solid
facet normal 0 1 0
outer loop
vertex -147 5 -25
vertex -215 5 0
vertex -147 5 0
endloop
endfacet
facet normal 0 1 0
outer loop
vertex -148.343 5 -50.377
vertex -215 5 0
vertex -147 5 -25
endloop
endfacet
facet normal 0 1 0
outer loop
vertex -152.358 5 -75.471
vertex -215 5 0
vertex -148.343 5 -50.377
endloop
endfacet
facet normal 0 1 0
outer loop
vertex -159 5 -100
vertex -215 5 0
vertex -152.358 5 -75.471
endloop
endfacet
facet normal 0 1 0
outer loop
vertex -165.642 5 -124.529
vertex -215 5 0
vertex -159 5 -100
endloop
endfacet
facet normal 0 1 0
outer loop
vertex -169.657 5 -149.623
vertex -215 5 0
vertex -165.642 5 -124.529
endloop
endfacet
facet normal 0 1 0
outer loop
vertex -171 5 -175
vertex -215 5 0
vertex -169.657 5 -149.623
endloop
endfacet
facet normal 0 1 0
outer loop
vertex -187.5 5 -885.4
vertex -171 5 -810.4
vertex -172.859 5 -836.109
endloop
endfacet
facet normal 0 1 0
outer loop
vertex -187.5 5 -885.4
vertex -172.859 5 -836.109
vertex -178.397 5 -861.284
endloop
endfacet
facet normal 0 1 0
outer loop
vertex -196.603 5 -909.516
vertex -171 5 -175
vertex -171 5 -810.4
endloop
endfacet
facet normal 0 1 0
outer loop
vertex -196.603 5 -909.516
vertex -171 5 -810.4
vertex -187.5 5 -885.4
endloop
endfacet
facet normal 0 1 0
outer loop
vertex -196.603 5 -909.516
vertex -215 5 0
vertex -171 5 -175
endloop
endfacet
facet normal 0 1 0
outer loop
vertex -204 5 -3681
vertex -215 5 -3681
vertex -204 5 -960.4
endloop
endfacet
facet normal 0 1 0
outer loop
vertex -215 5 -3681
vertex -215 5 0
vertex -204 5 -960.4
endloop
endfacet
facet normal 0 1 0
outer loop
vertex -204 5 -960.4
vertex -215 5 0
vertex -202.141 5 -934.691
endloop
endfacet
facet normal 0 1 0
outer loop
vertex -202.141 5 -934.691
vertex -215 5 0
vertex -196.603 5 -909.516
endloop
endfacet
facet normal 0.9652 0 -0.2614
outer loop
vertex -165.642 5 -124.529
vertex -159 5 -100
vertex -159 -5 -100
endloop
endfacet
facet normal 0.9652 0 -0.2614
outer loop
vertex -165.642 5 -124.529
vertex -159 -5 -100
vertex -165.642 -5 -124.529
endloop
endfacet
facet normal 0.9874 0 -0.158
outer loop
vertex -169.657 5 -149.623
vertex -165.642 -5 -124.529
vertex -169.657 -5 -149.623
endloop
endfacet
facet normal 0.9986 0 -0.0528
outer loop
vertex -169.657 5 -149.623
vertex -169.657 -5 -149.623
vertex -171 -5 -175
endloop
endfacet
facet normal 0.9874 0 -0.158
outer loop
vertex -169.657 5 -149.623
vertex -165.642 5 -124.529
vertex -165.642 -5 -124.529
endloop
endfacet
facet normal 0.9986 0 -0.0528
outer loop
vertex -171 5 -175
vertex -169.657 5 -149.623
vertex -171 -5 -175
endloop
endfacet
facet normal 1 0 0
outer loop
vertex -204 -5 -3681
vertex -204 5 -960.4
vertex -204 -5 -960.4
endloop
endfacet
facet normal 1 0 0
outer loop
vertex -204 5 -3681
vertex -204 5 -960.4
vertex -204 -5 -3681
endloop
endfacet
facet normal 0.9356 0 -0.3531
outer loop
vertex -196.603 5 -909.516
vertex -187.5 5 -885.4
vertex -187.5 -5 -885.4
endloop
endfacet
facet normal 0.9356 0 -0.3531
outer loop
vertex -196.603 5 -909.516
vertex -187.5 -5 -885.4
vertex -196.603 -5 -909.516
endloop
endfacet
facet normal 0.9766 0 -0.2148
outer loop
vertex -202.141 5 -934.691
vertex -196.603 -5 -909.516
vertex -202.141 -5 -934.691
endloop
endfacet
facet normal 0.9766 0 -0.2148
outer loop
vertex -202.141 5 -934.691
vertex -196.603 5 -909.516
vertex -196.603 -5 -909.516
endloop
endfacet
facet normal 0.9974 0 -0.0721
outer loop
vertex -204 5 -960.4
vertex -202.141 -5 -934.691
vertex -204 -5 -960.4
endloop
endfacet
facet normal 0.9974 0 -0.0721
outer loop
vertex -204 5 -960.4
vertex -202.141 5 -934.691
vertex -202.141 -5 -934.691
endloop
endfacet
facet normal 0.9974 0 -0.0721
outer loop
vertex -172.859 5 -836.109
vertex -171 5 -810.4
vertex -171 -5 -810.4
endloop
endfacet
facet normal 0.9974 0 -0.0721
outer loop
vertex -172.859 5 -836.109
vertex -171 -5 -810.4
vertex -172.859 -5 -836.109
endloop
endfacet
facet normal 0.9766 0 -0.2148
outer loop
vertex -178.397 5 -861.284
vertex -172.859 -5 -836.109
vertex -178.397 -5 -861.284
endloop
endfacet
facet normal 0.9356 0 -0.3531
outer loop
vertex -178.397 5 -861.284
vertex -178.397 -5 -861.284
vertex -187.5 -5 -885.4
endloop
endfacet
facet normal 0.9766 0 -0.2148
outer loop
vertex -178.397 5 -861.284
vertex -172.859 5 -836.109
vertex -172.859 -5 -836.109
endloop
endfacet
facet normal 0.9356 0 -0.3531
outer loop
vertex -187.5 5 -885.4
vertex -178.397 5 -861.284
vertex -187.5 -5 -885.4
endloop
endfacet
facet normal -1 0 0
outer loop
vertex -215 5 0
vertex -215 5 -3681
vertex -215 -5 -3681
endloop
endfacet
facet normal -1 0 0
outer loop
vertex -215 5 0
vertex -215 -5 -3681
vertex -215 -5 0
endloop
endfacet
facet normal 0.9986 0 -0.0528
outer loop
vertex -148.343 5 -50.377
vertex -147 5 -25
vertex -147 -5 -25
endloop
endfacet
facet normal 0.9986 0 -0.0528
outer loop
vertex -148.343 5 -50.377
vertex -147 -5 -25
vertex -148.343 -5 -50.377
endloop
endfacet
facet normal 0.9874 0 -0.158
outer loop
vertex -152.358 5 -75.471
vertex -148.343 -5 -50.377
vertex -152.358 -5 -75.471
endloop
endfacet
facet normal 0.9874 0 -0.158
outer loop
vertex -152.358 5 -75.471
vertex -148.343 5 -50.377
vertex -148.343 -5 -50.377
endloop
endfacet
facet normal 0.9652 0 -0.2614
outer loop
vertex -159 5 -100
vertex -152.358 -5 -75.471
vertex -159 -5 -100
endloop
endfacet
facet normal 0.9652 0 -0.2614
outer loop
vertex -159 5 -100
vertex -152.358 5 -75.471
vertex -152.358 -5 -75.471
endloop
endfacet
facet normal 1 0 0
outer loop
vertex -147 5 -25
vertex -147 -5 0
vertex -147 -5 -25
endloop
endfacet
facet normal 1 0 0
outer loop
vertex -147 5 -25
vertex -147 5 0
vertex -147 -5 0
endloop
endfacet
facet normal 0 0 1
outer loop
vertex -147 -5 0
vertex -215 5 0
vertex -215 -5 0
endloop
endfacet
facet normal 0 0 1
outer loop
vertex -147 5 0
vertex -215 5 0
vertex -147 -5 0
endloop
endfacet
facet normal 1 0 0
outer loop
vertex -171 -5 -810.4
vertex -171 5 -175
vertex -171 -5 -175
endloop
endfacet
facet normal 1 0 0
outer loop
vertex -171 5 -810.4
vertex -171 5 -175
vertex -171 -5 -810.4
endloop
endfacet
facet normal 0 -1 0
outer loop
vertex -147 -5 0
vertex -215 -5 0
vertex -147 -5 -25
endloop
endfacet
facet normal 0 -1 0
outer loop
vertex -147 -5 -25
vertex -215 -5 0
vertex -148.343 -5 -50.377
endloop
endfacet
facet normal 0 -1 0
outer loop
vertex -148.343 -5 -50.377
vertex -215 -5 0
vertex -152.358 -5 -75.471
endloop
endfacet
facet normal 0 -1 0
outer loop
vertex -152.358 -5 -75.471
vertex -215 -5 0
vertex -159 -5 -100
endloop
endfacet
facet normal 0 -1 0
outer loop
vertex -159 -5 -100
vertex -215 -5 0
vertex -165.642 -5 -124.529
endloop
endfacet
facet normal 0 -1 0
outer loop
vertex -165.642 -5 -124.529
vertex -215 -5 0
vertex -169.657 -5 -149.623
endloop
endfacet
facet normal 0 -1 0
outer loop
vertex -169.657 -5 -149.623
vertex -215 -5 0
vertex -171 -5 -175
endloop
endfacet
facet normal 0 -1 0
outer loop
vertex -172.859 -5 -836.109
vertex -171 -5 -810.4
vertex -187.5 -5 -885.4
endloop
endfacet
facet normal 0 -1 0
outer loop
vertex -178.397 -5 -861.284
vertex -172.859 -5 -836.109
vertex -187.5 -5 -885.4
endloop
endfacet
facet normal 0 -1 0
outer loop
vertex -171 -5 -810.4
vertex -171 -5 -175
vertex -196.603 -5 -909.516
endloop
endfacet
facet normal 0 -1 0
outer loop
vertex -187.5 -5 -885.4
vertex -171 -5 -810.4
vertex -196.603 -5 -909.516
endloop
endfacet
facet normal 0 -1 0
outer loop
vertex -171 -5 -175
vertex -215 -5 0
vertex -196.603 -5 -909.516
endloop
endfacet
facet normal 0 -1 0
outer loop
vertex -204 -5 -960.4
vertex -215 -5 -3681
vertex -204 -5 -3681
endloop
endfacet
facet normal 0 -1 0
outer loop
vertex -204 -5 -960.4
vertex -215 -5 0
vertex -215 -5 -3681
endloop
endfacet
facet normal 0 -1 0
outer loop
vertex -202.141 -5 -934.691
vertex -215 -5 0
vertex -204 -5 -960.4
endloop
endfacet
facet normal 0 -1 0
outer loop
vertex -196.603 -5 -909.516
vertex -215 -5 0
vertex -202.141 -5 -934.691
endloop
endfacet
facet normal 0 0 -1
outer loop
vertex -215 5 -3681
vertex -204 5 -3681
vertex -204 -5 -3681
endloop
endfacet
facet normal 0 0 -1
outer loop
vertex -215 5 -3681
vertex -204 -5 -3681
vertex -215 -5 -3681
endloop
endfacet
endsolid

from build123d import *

# Parameters (mm, degrees)
EXTRUDE_THIN1_DEPTH = 5
EXTRUDE1_DEPTH      = 10


with BuildPart() as part:
    # Sketch1 → Extrude-Thin1 (new body, symmetric)
    with BuildSketch(Plane(origin=(0, 0, 0), x_dir=(1, 0, 0), z_dir=(0, 1, 0))):
        with BuildLine():
            Line((-147, 0), (-147, 25))
            ThreePointArc((-147, 25), (-150.018958103, 62.976966704), (-159, 100))
            ThreePointArc((-159, 100), (-167.981041897, 137.023033296), (-171, 175))
            Line((-171, 175), (-171, 810.4))
            ThreePointArc((-171, 810.4), (-175.173739961, 848.796777209), (-187.5, 885.4))
            ThreePointArc((-187.5, 885.4), (-199.826260039, 922.003222791), (-204, 960.4))
            Line((-204, 960.4), (-204, 3680.99975))
            Line((-204, 3680.99975), (-215, 3680.99975))
            Line((-215, 3680.99975), (-215, 960.4))
            ThreePointArc((-215, 960.4), (-210.569349172, 919.639743182), (-197.484357116, 880.783441435))
            ThreePointArc((-197.484357116, 880.783441435), (-185.916829095, 846.433297599), (-182, 810.4))
            Line((-182, 810.4), (-182, 175))
            ThreePointArc((-182, 175), (-178.842888848, 135.285137784), (-169.450858034, 96.567862715))
            ThreePointArc((-169.450858034, 96.567862715), (-160.880805054, 61.239071191), (-158, 25))
            Line((-158, 25), (-158, 0))
            Line((-158, 0), (-147, 0))
        make_face()
    extrude(amount=EXTRUDE_THIN1_DEPTH, both=True)

    # Sketch3 → Extrude1 (add)
    with BuildSketch(Plane(origin=(0, 5, 0), x_dir=(1, 0, 0), z_dir=(0, 1, 0))):
        with BuildLine():
            Line((-158, 0), (-158, 25))
            ThreePointArc((-158, 25), (-160.880805054, 61.239071191), (-169.450858034, 96.567862715))
            ThreePointArc((-169.450858034, 96.567862715), (-178.842888848, 135.285137784), (-182, 175))
            Line((-182, 175), (-182, 810.4))
            ThreePointArc((-182, 810.4), (-185.916829095, 846.433297599), (-197.484357116, 880.783441435))
            ThreePointArc((-197.484357116, 880.783441435), (-210.569349172, 919.639743182), (-215, 960.4))
            Line((-215, 960.4), (-215, 0))
            Line((-215, 0), (-158, 0))
        make_face()
    extrude(amount=-EXTRUDE1_DEPTH)


solid = part.part
